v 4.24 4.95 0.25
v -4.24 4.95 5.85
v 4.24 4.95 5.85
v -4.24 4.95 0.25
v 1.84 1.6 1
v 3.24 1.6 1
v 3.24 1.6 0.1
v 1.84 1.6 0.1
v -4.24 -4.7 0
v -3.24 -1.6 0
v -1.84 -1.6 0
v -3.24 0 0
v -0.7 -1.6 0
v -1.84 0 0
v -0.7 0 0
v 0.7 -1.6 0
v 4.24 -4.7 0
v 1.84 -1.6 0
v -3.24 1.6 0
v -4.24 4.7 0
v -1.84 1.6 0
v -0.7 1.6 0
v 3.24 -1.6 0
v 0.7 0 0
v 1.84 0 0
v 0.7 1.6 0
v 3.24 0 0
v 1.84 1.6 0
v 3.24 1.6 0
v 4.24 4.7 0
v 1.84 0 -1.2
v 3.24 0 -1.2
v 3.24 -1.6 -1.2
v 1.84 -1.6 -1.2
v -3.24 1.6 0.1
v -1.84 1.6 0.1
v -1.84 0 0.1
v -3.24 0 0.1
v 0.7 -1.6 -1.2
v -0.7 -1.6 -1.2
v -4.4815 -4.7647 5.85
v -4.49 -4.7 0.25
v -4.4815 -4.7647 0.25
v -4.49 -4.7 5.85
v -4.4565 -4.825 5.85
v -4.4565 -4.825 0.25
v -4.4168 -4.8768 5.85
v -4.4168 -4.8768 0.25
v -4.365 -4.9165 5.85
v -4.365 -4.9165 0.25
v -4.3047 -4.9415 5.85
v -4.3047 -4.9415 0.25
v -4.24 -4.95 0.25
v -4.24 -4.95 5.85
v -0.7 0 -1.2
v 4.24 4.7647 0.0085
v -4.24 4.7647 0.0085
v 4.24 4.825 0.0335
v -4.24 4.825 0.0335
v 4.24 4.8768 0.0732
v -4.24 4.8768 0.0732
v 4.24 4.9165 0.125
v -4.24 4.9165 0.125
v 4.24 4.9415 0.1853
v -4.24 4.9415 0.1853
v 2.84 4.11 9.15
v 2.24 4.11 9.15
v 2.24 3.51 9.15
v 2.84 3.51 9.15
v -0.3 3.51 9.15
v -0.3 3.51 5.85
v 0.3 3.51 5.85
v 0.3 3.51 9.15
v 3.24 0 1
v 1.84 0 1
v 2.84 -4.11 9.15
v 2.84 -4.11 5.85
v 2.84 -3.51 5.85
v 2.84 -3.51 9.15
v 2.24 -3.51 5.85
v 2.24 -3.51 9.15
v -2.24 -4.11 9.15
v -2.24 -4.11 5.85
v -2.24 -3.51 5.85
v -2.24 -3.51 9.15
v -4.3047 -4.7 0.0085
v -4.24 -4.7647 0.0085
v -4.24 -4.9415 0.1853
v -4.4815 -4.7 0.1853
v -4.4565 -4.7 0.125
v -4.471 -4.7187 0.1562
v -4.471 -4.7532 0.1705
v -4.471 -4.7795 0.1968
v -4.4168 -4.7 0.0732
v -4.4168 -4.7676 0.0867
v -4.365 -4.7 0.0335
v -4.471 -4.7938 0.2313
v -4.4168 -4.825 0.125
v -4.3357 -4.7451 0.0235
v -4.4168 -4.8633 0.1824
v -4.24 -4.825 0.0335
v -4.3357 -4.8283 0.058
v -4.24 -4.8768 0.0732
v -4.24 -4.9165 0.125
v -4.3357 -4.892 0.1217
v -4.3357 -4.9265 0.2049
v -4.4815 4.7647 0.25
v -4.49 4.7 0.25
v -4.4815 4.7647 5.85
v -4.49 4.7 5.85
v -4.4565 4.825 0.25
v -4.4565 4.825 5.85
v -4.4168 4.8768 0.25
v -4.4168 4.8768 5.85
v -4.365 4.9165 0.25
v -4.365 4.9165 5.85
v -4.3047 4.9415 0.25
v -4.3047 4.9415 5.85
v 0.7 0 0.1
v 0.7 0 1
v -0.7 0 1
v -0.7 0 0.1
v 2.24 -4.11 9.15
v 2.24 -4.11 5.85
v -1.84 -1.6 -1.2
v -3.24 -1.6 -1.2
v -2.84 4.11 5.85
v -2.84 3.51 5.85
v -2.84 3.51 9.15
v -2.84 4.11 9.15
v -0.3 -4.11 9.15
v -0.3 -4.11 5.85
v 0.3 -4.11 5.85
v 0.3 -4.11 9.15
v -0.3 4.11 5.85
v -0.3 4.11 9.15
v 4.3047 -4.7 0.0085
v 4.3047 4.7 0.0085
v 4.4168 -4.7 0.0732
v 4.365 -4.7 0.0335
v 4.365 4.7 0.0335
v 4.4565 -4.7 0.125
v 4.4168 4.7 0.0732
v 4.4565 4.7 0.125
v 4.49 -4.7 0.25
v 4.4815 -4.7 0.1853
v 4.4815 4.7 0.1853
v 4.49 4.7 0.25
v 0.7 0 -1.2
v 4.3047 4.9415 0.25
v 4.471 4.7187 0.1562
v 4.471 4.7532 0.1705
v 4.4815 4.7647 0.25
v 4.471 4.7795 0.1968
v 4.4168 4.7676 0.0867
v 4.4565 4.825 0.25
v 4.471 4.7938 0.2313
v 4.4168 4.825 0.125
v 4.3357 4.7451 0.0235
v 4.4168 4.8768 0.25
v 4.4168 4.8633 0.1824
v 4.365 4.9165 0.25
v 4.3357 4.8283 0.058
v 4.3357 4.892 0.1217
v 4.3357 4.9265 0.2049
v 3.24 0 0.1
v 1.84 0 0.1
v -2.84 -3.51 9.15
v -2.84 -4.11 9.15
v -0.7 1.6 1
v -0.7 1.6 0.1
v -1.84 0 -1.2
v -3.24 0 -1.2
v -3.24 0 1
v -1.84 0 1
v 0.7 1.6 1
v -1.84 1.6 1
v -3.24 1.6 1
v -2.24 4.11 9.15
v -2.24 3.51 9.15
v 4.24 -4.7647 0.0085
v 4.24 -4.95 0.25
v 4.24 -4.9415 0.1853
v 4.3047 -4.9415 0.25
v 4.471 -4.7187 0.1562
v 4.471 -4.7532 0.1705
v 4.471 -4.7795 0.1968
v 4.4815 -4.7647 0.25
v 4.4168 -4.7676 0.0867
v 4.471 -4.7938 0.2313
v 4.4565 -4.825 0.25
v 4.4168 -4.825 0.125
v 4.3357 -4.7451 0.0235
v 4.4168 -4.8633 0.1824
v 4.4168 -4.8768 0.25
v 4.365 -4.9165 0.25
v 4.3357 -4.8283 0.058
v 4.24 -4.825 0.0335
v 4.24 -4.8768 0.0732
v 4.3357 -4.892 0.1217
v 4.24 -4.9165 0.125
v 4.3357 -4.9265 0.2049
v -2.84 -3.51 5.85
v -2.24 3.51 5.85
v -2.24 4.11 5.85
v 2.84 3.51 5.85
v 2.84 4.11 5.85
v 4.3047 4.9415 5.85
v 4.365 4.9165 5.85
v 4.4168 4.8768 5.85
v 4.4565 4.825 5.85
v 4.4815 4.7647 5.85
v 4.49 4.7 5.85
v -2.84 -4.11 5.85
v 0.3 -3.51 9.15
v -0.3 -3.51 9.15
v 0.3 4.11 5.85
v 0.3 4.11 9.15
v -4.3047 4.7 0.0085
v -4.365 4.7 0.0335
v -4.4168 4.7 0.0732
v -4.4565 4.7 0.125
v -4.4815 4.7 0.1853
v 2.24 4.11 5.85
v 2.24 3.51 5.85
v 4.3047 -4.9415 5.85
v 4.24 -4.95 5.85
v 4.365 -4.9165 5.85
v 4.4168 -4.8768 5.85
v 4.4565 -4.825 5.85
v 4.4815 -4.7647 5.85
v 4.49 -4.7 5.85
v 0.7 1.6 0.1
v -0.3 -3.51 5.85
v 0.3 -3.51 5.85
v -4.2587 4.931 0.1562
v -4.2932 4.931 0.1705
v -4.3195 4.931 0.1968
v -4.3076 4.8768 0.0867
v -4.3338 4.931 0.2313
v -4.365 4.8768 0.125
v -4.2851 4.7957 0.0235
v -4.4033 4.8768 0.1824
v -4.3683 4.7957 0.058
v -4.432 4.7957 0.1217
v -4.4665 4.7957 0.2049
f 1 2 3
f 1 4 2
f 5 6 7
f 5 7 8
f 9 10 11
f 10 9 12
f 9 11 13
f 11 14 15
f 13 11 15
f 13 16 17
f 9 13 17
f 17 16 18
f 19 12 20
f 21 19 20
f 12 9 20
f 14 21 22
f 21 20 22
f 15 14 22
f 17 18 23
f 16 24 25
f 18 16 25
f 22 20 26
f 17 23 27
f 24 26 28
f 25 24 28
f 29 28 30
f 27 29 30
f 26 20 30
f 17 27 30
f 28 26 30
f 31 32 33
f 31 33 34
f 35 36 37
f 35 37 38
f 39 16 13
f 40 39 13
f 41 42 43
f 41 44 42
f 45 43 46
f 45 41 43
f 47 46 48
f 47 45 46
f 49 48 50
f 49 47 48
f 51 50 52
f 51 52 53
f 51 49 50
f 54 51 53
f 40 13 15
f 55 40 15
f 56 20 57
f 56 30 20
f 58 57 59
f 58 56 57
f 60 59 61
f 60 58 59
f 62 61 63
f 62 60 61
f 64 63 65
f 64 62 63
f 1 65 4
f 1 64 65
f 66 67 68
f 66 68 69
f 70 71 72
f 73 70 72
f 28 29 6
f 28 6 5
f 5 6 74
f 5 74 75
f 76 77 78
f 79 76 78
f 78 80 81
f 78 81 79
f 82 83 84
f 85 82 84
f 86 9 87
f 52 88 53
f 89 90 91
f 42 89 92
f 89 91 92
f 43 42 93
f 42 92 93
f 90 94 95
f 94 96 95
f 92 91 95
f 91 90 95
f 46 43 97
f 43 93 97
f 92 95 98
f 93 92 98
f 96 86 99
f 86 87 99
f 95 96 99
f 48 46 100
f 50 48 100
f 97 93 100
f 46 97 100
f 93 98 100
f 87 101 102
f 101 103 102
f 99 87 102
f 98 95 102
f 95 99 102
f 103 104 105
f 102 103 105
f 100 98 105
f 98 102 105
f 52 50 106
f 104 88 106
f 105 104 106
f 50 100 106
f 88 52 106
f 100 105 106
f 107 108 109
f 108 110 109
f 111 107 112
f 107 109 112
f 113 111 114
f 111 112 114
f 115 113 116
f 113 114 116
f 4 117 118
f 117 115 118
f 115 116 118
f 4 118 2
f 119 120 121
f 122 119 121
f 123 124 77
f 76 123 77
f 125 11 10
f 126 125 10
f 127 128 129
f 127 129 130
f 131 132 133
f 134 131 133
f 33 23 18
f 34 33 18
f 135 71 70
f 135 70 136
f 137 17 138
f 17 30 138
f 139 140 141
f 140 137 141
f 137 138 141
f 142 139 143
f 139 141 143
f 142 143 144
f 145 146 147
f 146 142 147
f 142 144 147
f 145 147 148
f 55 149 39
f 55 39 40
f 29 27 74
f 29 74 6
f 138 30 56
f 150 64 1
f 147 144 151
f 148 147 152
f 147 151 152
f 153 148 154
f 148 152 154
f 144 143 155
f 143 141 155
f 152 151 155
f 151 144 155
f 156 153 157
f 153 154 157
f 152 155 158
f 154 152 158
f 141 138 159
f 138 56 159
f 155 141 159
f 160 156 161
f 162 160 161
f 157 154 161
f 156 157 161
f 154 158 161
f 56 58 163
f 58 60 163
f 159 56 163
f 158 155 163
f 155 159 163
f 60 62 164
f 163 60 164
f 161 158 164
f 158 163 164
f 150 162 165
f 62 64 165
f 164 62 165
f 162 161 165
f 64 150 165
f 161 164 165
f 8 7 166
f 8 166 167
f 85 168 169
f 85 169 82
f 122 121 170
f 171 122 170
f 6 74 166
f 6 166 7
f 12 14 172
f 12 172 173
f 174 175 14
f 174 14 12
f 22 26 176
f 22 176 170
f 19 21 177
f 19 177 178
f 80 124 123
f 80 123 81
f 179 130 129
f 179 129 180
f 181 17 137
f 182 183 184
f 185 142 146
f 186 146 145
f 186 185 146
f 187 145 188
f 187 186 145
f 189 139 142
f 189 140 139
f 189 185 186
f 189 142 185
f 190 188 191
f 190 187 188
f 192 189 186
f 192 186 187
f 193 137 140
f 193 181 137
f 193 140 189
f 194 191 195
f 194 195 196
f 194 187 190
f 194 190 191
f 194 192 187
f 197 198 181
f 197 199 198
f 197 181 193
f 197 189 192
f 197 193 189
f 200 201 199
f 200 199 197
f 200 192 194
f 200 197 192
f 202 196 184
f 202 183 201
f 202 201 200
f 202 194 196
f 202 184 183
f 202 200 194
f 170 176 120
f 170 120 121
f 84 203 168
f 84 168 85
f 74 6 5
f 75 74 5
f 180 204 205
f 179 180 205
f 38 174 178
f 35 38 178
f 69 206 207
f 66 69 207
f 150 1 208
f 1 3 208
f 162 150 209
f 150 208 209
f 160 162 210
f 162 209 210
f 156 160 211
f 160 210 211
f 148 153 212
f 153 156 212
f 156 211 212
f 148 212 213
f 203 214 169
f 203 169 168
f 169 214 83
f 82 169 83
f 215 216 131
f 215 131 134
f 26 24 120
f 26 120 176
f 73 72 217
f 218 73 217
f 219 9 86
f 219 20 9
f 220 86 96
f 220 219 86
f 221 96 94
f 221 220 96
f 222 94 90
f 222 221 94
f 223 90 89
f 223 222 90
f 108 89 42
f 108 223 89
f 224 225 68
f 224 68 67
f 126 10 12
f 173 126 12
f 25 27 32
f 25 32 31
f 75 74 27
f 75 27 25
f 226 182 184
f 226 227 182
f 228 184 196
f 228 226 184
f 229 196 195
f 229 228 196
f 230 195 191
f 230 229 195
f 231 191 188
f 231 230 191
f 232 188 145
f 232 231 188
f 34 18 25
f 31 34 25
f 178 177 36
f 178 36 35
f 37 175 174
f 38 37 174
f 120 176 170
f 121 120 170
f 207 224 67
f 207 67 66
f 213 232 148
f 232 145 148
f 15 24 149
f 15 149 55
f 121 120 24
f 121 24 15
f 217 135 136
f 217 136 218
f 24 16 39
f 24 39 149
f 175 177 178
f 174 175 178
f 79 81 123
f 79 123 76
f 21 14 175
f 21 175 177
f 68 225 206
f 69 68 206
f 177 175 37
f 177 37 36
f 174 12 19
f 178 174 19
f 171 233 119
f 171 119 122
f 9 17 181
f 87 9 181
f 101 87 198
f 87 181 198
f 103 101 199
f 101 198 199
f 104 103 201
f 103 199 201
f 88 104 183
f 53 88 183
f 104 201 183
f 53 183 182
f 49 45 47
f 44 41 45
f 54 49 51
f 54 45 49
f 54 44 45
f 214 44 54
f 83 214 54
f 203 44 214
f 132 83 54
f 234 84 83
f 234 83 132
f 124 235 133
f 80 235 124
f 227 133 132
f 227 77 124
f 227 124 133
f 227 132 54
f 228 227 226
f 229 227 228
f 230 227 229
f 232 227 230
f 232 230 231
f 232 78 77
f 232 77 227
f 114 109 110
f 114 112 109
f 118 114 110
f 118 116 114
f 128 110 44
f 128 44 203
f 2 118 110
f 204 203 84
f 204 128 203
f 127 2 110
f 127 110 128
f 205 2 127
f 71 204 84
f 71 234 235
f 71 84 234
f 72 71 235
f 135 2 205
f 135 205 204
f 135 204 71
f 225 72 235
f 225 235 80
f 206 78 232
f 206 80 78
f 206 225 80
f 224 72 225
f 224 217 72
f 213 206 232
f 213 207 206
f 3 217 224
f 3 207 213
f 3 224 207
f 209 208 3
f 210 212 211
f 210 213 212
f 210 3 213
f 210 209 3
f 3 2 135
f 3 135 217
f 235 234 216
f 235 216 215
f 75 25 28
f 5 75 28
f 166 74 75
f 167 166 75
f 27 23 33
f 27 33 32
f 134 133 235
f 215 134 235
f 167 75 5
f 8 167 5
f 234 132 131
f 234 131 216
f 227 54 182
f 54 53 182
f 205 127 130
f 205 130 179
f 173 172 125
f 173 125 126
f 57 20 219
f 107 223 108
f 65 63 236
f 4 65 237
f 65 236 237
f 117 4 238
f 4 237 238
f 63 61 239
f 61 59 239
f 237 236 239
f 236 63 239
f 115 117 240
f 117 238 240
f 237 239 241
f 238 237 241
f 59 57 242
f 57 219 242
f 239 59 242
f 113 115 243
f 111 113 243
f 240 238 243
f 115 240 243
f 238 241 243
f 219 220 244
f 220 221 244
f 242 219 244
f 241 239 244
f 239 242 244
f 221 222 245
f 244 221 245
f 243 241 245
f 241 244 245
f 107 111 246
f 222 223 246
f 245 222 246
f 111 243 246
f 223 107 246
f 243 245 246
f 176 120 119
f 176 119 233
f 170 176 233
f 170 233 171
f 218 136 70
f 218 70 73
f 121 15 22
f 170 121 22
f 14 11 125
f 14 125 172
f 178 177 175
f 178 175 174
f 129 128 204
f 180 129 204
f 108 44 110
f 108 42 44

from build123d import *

# Parameters (mm, degrees)
IZIM1_W                       = 8.98
IZIM1_H                       = 9.9
Y_KSEKLIK_EKSTR_ZYON1_DEPTH   = 5.85
IZIM2_W                       = 1.4
IZIM2_H                       = 3.2
KES_EKSTR_ZYON1_DEPTH         = 1
IZIM3_W                       = 1.4
IZIM3_H                       = 1.6
Y_KSEKLIK_EKSTR_ZYON2_DEPTH   = 2.2
IZIM4_W                       = 1.4
IZIM4_H                       = 1.6
Y_KSEKLIK_EKSTR_ZYON3_DEPTH   = 0.9
Y_KSEKLIK_EKSTR_ZYON3_2_DEPTH = 0.9
Y_KSEKLIK_EKSTR_ZYON3_3_DEPTH = 0.9
RADYUS1_R                     = 0.25
IZIM5_W                       = 0.6
IZIM5_H                       = 0.6
Y_KSEKLIK_EKSTR_ZYON4_DEPTH   = 3.3


with BuildPart() as part:
    # Çizim1 → Yükseklik-Ekstrüzyon1 (new body)
    with BuildSketch(Plane.XY):
        Rectangle(IZIM1_W, IZIM1_H)
    extrude(amount=Y_KSEKLIK_EKSTR_ZYON1_DEPTH)

    # Çizim2 → Kes-Ekstrüzyon1 (cut)
    with BuildSketch(Plane(origin=(0, 0, 0), x_dir=(-1, 0, 0), z_dir=(0, 0, -1))):
        with Locations((-2.54, 0)):
            Rectangle(IZIM2_W, IZIM2_H)
        Rectangle(IZIM2_W, IZIM2_H)
        with Locations((2.54, 0)):
            Rectangle(IZIM2_W, IZIM2_H)
    extrude(amount=-KES_EKSTR_ZYON1_DEPTH, mode=Mode.SUBTRACT)

    # Çizim3 → Yükseklik-Ekstrüzyon2 (add)
    with BuildSketch(Plane(origin=(0, 0, 1), x_dir=(-1, 0, 0), z_dir=(0, 0, -1))):
        with Locations((-2.54, -0.8)):
            Rectangle(IZIM3_W, IZIM3_H)
        with Locations((0, -0.8)):
            Rectangle(IZIM3_W, IZIM3_H)
        with Locations((2.54, -0.8)):
            Rectangle(IZIM3_W, IZIM3_H)
    extrude(amount=Y_KSEKLIK_EKSTR_ZYON2_DEPTH)

    # Radyus1
    radyus1_edges = [part.edges().sort_by_distance(p)[0] for p in [
        (0, -4.95, 0),
        (-4.49, 0, 0),
        (0, 4.95, 0),
        (4.49, 0, 0),
        (4.49, -4.95, 2.925),
        (-4.49, -4.95, 2.925),
        (-4.49, 4.95, 2.925),
        (4.49, 4.95, 2.925),
    ]]
    fillet(radyus1_edges, radius=RADYUS1_R)

    # Çizim5 → Yükseklik-Ekstrüzyon4 (add)
    with BuildSketch(Plane.XY.offset(5.85)):
        with Locations((-2.54, -3.81)):
            Rectangle(IZIM5_W, IZIM5_H)
        with Locations((-2.54, 3.81)):
            Rectangle(IZIM5_W, IZIM5_H)
        with Locations((0, -3.81)):
            Rectangle(IZIM5_W, IZIM5_H)
        with Locations((0, 3.81)):
            Rectangle(IZIM5_W, IZIM5_H)
        with Locations((2.54, 3.81)):
            Rectangle(IZIM5_W, IZIM5_H)
        with Locations((2.54, -3.81)):
            Rectangle(IZIM5_W, IZIM5_H)
    extrude(amount=Y_KSEKLIK_EKSTR_ZYON4_DEPTH)


with BuildPart() as body_2:
    # Çizim4 → Yükseklik-Ekstrüzyon3 (new body)
    with BuildSketch(Plane(origin=(0, 0, 1), x_dir=(-1, 0, 0), z_dir=(0, 0, -1))):
        with Locations((-2.54, 0.8)):
            Rectangle(IZIM4_W, IZIM4_H)
    extrude(amount=Y_KSEKLIK_EKSTR_ZYON3_DEPTH)


with BuildPart() as body_3:
    # Çizim4 → Y_kseklik-Ekstr_zyon3 2 (new body)
    with BuildSketch(Plane(origin=(0, 0, 1), x_dir=(-1, 0, 0), z_dir=(0, 0, -1))):
        with Locations((0, 0.8)):
            Rectangle(IZIM4_W, IZIM4_H)
    extrude(amount=Y_KSEKLIK_EKSTR_ZYON3_2_DEPTH)


with BuildPart() as body_4:
    # Çizim4 → Y_kseklik-Ekstr_zyon3 3 (new body)
    with BuildSketch(Plane(origin=(0, 0, 1), x_dir=(-1, 0, 0), z_dir=(0, 0, -1))):
        with Locations((2.54, 0.8)):
            Rectangle(IZIM4_W, IZIM4_H)
    extrude(amount=Y_KSEKLIK_EKSTR_ZYON3_3_DEPTH)


solid = Compound([part.part, body_2.part, body_3.part, body_4.part])
